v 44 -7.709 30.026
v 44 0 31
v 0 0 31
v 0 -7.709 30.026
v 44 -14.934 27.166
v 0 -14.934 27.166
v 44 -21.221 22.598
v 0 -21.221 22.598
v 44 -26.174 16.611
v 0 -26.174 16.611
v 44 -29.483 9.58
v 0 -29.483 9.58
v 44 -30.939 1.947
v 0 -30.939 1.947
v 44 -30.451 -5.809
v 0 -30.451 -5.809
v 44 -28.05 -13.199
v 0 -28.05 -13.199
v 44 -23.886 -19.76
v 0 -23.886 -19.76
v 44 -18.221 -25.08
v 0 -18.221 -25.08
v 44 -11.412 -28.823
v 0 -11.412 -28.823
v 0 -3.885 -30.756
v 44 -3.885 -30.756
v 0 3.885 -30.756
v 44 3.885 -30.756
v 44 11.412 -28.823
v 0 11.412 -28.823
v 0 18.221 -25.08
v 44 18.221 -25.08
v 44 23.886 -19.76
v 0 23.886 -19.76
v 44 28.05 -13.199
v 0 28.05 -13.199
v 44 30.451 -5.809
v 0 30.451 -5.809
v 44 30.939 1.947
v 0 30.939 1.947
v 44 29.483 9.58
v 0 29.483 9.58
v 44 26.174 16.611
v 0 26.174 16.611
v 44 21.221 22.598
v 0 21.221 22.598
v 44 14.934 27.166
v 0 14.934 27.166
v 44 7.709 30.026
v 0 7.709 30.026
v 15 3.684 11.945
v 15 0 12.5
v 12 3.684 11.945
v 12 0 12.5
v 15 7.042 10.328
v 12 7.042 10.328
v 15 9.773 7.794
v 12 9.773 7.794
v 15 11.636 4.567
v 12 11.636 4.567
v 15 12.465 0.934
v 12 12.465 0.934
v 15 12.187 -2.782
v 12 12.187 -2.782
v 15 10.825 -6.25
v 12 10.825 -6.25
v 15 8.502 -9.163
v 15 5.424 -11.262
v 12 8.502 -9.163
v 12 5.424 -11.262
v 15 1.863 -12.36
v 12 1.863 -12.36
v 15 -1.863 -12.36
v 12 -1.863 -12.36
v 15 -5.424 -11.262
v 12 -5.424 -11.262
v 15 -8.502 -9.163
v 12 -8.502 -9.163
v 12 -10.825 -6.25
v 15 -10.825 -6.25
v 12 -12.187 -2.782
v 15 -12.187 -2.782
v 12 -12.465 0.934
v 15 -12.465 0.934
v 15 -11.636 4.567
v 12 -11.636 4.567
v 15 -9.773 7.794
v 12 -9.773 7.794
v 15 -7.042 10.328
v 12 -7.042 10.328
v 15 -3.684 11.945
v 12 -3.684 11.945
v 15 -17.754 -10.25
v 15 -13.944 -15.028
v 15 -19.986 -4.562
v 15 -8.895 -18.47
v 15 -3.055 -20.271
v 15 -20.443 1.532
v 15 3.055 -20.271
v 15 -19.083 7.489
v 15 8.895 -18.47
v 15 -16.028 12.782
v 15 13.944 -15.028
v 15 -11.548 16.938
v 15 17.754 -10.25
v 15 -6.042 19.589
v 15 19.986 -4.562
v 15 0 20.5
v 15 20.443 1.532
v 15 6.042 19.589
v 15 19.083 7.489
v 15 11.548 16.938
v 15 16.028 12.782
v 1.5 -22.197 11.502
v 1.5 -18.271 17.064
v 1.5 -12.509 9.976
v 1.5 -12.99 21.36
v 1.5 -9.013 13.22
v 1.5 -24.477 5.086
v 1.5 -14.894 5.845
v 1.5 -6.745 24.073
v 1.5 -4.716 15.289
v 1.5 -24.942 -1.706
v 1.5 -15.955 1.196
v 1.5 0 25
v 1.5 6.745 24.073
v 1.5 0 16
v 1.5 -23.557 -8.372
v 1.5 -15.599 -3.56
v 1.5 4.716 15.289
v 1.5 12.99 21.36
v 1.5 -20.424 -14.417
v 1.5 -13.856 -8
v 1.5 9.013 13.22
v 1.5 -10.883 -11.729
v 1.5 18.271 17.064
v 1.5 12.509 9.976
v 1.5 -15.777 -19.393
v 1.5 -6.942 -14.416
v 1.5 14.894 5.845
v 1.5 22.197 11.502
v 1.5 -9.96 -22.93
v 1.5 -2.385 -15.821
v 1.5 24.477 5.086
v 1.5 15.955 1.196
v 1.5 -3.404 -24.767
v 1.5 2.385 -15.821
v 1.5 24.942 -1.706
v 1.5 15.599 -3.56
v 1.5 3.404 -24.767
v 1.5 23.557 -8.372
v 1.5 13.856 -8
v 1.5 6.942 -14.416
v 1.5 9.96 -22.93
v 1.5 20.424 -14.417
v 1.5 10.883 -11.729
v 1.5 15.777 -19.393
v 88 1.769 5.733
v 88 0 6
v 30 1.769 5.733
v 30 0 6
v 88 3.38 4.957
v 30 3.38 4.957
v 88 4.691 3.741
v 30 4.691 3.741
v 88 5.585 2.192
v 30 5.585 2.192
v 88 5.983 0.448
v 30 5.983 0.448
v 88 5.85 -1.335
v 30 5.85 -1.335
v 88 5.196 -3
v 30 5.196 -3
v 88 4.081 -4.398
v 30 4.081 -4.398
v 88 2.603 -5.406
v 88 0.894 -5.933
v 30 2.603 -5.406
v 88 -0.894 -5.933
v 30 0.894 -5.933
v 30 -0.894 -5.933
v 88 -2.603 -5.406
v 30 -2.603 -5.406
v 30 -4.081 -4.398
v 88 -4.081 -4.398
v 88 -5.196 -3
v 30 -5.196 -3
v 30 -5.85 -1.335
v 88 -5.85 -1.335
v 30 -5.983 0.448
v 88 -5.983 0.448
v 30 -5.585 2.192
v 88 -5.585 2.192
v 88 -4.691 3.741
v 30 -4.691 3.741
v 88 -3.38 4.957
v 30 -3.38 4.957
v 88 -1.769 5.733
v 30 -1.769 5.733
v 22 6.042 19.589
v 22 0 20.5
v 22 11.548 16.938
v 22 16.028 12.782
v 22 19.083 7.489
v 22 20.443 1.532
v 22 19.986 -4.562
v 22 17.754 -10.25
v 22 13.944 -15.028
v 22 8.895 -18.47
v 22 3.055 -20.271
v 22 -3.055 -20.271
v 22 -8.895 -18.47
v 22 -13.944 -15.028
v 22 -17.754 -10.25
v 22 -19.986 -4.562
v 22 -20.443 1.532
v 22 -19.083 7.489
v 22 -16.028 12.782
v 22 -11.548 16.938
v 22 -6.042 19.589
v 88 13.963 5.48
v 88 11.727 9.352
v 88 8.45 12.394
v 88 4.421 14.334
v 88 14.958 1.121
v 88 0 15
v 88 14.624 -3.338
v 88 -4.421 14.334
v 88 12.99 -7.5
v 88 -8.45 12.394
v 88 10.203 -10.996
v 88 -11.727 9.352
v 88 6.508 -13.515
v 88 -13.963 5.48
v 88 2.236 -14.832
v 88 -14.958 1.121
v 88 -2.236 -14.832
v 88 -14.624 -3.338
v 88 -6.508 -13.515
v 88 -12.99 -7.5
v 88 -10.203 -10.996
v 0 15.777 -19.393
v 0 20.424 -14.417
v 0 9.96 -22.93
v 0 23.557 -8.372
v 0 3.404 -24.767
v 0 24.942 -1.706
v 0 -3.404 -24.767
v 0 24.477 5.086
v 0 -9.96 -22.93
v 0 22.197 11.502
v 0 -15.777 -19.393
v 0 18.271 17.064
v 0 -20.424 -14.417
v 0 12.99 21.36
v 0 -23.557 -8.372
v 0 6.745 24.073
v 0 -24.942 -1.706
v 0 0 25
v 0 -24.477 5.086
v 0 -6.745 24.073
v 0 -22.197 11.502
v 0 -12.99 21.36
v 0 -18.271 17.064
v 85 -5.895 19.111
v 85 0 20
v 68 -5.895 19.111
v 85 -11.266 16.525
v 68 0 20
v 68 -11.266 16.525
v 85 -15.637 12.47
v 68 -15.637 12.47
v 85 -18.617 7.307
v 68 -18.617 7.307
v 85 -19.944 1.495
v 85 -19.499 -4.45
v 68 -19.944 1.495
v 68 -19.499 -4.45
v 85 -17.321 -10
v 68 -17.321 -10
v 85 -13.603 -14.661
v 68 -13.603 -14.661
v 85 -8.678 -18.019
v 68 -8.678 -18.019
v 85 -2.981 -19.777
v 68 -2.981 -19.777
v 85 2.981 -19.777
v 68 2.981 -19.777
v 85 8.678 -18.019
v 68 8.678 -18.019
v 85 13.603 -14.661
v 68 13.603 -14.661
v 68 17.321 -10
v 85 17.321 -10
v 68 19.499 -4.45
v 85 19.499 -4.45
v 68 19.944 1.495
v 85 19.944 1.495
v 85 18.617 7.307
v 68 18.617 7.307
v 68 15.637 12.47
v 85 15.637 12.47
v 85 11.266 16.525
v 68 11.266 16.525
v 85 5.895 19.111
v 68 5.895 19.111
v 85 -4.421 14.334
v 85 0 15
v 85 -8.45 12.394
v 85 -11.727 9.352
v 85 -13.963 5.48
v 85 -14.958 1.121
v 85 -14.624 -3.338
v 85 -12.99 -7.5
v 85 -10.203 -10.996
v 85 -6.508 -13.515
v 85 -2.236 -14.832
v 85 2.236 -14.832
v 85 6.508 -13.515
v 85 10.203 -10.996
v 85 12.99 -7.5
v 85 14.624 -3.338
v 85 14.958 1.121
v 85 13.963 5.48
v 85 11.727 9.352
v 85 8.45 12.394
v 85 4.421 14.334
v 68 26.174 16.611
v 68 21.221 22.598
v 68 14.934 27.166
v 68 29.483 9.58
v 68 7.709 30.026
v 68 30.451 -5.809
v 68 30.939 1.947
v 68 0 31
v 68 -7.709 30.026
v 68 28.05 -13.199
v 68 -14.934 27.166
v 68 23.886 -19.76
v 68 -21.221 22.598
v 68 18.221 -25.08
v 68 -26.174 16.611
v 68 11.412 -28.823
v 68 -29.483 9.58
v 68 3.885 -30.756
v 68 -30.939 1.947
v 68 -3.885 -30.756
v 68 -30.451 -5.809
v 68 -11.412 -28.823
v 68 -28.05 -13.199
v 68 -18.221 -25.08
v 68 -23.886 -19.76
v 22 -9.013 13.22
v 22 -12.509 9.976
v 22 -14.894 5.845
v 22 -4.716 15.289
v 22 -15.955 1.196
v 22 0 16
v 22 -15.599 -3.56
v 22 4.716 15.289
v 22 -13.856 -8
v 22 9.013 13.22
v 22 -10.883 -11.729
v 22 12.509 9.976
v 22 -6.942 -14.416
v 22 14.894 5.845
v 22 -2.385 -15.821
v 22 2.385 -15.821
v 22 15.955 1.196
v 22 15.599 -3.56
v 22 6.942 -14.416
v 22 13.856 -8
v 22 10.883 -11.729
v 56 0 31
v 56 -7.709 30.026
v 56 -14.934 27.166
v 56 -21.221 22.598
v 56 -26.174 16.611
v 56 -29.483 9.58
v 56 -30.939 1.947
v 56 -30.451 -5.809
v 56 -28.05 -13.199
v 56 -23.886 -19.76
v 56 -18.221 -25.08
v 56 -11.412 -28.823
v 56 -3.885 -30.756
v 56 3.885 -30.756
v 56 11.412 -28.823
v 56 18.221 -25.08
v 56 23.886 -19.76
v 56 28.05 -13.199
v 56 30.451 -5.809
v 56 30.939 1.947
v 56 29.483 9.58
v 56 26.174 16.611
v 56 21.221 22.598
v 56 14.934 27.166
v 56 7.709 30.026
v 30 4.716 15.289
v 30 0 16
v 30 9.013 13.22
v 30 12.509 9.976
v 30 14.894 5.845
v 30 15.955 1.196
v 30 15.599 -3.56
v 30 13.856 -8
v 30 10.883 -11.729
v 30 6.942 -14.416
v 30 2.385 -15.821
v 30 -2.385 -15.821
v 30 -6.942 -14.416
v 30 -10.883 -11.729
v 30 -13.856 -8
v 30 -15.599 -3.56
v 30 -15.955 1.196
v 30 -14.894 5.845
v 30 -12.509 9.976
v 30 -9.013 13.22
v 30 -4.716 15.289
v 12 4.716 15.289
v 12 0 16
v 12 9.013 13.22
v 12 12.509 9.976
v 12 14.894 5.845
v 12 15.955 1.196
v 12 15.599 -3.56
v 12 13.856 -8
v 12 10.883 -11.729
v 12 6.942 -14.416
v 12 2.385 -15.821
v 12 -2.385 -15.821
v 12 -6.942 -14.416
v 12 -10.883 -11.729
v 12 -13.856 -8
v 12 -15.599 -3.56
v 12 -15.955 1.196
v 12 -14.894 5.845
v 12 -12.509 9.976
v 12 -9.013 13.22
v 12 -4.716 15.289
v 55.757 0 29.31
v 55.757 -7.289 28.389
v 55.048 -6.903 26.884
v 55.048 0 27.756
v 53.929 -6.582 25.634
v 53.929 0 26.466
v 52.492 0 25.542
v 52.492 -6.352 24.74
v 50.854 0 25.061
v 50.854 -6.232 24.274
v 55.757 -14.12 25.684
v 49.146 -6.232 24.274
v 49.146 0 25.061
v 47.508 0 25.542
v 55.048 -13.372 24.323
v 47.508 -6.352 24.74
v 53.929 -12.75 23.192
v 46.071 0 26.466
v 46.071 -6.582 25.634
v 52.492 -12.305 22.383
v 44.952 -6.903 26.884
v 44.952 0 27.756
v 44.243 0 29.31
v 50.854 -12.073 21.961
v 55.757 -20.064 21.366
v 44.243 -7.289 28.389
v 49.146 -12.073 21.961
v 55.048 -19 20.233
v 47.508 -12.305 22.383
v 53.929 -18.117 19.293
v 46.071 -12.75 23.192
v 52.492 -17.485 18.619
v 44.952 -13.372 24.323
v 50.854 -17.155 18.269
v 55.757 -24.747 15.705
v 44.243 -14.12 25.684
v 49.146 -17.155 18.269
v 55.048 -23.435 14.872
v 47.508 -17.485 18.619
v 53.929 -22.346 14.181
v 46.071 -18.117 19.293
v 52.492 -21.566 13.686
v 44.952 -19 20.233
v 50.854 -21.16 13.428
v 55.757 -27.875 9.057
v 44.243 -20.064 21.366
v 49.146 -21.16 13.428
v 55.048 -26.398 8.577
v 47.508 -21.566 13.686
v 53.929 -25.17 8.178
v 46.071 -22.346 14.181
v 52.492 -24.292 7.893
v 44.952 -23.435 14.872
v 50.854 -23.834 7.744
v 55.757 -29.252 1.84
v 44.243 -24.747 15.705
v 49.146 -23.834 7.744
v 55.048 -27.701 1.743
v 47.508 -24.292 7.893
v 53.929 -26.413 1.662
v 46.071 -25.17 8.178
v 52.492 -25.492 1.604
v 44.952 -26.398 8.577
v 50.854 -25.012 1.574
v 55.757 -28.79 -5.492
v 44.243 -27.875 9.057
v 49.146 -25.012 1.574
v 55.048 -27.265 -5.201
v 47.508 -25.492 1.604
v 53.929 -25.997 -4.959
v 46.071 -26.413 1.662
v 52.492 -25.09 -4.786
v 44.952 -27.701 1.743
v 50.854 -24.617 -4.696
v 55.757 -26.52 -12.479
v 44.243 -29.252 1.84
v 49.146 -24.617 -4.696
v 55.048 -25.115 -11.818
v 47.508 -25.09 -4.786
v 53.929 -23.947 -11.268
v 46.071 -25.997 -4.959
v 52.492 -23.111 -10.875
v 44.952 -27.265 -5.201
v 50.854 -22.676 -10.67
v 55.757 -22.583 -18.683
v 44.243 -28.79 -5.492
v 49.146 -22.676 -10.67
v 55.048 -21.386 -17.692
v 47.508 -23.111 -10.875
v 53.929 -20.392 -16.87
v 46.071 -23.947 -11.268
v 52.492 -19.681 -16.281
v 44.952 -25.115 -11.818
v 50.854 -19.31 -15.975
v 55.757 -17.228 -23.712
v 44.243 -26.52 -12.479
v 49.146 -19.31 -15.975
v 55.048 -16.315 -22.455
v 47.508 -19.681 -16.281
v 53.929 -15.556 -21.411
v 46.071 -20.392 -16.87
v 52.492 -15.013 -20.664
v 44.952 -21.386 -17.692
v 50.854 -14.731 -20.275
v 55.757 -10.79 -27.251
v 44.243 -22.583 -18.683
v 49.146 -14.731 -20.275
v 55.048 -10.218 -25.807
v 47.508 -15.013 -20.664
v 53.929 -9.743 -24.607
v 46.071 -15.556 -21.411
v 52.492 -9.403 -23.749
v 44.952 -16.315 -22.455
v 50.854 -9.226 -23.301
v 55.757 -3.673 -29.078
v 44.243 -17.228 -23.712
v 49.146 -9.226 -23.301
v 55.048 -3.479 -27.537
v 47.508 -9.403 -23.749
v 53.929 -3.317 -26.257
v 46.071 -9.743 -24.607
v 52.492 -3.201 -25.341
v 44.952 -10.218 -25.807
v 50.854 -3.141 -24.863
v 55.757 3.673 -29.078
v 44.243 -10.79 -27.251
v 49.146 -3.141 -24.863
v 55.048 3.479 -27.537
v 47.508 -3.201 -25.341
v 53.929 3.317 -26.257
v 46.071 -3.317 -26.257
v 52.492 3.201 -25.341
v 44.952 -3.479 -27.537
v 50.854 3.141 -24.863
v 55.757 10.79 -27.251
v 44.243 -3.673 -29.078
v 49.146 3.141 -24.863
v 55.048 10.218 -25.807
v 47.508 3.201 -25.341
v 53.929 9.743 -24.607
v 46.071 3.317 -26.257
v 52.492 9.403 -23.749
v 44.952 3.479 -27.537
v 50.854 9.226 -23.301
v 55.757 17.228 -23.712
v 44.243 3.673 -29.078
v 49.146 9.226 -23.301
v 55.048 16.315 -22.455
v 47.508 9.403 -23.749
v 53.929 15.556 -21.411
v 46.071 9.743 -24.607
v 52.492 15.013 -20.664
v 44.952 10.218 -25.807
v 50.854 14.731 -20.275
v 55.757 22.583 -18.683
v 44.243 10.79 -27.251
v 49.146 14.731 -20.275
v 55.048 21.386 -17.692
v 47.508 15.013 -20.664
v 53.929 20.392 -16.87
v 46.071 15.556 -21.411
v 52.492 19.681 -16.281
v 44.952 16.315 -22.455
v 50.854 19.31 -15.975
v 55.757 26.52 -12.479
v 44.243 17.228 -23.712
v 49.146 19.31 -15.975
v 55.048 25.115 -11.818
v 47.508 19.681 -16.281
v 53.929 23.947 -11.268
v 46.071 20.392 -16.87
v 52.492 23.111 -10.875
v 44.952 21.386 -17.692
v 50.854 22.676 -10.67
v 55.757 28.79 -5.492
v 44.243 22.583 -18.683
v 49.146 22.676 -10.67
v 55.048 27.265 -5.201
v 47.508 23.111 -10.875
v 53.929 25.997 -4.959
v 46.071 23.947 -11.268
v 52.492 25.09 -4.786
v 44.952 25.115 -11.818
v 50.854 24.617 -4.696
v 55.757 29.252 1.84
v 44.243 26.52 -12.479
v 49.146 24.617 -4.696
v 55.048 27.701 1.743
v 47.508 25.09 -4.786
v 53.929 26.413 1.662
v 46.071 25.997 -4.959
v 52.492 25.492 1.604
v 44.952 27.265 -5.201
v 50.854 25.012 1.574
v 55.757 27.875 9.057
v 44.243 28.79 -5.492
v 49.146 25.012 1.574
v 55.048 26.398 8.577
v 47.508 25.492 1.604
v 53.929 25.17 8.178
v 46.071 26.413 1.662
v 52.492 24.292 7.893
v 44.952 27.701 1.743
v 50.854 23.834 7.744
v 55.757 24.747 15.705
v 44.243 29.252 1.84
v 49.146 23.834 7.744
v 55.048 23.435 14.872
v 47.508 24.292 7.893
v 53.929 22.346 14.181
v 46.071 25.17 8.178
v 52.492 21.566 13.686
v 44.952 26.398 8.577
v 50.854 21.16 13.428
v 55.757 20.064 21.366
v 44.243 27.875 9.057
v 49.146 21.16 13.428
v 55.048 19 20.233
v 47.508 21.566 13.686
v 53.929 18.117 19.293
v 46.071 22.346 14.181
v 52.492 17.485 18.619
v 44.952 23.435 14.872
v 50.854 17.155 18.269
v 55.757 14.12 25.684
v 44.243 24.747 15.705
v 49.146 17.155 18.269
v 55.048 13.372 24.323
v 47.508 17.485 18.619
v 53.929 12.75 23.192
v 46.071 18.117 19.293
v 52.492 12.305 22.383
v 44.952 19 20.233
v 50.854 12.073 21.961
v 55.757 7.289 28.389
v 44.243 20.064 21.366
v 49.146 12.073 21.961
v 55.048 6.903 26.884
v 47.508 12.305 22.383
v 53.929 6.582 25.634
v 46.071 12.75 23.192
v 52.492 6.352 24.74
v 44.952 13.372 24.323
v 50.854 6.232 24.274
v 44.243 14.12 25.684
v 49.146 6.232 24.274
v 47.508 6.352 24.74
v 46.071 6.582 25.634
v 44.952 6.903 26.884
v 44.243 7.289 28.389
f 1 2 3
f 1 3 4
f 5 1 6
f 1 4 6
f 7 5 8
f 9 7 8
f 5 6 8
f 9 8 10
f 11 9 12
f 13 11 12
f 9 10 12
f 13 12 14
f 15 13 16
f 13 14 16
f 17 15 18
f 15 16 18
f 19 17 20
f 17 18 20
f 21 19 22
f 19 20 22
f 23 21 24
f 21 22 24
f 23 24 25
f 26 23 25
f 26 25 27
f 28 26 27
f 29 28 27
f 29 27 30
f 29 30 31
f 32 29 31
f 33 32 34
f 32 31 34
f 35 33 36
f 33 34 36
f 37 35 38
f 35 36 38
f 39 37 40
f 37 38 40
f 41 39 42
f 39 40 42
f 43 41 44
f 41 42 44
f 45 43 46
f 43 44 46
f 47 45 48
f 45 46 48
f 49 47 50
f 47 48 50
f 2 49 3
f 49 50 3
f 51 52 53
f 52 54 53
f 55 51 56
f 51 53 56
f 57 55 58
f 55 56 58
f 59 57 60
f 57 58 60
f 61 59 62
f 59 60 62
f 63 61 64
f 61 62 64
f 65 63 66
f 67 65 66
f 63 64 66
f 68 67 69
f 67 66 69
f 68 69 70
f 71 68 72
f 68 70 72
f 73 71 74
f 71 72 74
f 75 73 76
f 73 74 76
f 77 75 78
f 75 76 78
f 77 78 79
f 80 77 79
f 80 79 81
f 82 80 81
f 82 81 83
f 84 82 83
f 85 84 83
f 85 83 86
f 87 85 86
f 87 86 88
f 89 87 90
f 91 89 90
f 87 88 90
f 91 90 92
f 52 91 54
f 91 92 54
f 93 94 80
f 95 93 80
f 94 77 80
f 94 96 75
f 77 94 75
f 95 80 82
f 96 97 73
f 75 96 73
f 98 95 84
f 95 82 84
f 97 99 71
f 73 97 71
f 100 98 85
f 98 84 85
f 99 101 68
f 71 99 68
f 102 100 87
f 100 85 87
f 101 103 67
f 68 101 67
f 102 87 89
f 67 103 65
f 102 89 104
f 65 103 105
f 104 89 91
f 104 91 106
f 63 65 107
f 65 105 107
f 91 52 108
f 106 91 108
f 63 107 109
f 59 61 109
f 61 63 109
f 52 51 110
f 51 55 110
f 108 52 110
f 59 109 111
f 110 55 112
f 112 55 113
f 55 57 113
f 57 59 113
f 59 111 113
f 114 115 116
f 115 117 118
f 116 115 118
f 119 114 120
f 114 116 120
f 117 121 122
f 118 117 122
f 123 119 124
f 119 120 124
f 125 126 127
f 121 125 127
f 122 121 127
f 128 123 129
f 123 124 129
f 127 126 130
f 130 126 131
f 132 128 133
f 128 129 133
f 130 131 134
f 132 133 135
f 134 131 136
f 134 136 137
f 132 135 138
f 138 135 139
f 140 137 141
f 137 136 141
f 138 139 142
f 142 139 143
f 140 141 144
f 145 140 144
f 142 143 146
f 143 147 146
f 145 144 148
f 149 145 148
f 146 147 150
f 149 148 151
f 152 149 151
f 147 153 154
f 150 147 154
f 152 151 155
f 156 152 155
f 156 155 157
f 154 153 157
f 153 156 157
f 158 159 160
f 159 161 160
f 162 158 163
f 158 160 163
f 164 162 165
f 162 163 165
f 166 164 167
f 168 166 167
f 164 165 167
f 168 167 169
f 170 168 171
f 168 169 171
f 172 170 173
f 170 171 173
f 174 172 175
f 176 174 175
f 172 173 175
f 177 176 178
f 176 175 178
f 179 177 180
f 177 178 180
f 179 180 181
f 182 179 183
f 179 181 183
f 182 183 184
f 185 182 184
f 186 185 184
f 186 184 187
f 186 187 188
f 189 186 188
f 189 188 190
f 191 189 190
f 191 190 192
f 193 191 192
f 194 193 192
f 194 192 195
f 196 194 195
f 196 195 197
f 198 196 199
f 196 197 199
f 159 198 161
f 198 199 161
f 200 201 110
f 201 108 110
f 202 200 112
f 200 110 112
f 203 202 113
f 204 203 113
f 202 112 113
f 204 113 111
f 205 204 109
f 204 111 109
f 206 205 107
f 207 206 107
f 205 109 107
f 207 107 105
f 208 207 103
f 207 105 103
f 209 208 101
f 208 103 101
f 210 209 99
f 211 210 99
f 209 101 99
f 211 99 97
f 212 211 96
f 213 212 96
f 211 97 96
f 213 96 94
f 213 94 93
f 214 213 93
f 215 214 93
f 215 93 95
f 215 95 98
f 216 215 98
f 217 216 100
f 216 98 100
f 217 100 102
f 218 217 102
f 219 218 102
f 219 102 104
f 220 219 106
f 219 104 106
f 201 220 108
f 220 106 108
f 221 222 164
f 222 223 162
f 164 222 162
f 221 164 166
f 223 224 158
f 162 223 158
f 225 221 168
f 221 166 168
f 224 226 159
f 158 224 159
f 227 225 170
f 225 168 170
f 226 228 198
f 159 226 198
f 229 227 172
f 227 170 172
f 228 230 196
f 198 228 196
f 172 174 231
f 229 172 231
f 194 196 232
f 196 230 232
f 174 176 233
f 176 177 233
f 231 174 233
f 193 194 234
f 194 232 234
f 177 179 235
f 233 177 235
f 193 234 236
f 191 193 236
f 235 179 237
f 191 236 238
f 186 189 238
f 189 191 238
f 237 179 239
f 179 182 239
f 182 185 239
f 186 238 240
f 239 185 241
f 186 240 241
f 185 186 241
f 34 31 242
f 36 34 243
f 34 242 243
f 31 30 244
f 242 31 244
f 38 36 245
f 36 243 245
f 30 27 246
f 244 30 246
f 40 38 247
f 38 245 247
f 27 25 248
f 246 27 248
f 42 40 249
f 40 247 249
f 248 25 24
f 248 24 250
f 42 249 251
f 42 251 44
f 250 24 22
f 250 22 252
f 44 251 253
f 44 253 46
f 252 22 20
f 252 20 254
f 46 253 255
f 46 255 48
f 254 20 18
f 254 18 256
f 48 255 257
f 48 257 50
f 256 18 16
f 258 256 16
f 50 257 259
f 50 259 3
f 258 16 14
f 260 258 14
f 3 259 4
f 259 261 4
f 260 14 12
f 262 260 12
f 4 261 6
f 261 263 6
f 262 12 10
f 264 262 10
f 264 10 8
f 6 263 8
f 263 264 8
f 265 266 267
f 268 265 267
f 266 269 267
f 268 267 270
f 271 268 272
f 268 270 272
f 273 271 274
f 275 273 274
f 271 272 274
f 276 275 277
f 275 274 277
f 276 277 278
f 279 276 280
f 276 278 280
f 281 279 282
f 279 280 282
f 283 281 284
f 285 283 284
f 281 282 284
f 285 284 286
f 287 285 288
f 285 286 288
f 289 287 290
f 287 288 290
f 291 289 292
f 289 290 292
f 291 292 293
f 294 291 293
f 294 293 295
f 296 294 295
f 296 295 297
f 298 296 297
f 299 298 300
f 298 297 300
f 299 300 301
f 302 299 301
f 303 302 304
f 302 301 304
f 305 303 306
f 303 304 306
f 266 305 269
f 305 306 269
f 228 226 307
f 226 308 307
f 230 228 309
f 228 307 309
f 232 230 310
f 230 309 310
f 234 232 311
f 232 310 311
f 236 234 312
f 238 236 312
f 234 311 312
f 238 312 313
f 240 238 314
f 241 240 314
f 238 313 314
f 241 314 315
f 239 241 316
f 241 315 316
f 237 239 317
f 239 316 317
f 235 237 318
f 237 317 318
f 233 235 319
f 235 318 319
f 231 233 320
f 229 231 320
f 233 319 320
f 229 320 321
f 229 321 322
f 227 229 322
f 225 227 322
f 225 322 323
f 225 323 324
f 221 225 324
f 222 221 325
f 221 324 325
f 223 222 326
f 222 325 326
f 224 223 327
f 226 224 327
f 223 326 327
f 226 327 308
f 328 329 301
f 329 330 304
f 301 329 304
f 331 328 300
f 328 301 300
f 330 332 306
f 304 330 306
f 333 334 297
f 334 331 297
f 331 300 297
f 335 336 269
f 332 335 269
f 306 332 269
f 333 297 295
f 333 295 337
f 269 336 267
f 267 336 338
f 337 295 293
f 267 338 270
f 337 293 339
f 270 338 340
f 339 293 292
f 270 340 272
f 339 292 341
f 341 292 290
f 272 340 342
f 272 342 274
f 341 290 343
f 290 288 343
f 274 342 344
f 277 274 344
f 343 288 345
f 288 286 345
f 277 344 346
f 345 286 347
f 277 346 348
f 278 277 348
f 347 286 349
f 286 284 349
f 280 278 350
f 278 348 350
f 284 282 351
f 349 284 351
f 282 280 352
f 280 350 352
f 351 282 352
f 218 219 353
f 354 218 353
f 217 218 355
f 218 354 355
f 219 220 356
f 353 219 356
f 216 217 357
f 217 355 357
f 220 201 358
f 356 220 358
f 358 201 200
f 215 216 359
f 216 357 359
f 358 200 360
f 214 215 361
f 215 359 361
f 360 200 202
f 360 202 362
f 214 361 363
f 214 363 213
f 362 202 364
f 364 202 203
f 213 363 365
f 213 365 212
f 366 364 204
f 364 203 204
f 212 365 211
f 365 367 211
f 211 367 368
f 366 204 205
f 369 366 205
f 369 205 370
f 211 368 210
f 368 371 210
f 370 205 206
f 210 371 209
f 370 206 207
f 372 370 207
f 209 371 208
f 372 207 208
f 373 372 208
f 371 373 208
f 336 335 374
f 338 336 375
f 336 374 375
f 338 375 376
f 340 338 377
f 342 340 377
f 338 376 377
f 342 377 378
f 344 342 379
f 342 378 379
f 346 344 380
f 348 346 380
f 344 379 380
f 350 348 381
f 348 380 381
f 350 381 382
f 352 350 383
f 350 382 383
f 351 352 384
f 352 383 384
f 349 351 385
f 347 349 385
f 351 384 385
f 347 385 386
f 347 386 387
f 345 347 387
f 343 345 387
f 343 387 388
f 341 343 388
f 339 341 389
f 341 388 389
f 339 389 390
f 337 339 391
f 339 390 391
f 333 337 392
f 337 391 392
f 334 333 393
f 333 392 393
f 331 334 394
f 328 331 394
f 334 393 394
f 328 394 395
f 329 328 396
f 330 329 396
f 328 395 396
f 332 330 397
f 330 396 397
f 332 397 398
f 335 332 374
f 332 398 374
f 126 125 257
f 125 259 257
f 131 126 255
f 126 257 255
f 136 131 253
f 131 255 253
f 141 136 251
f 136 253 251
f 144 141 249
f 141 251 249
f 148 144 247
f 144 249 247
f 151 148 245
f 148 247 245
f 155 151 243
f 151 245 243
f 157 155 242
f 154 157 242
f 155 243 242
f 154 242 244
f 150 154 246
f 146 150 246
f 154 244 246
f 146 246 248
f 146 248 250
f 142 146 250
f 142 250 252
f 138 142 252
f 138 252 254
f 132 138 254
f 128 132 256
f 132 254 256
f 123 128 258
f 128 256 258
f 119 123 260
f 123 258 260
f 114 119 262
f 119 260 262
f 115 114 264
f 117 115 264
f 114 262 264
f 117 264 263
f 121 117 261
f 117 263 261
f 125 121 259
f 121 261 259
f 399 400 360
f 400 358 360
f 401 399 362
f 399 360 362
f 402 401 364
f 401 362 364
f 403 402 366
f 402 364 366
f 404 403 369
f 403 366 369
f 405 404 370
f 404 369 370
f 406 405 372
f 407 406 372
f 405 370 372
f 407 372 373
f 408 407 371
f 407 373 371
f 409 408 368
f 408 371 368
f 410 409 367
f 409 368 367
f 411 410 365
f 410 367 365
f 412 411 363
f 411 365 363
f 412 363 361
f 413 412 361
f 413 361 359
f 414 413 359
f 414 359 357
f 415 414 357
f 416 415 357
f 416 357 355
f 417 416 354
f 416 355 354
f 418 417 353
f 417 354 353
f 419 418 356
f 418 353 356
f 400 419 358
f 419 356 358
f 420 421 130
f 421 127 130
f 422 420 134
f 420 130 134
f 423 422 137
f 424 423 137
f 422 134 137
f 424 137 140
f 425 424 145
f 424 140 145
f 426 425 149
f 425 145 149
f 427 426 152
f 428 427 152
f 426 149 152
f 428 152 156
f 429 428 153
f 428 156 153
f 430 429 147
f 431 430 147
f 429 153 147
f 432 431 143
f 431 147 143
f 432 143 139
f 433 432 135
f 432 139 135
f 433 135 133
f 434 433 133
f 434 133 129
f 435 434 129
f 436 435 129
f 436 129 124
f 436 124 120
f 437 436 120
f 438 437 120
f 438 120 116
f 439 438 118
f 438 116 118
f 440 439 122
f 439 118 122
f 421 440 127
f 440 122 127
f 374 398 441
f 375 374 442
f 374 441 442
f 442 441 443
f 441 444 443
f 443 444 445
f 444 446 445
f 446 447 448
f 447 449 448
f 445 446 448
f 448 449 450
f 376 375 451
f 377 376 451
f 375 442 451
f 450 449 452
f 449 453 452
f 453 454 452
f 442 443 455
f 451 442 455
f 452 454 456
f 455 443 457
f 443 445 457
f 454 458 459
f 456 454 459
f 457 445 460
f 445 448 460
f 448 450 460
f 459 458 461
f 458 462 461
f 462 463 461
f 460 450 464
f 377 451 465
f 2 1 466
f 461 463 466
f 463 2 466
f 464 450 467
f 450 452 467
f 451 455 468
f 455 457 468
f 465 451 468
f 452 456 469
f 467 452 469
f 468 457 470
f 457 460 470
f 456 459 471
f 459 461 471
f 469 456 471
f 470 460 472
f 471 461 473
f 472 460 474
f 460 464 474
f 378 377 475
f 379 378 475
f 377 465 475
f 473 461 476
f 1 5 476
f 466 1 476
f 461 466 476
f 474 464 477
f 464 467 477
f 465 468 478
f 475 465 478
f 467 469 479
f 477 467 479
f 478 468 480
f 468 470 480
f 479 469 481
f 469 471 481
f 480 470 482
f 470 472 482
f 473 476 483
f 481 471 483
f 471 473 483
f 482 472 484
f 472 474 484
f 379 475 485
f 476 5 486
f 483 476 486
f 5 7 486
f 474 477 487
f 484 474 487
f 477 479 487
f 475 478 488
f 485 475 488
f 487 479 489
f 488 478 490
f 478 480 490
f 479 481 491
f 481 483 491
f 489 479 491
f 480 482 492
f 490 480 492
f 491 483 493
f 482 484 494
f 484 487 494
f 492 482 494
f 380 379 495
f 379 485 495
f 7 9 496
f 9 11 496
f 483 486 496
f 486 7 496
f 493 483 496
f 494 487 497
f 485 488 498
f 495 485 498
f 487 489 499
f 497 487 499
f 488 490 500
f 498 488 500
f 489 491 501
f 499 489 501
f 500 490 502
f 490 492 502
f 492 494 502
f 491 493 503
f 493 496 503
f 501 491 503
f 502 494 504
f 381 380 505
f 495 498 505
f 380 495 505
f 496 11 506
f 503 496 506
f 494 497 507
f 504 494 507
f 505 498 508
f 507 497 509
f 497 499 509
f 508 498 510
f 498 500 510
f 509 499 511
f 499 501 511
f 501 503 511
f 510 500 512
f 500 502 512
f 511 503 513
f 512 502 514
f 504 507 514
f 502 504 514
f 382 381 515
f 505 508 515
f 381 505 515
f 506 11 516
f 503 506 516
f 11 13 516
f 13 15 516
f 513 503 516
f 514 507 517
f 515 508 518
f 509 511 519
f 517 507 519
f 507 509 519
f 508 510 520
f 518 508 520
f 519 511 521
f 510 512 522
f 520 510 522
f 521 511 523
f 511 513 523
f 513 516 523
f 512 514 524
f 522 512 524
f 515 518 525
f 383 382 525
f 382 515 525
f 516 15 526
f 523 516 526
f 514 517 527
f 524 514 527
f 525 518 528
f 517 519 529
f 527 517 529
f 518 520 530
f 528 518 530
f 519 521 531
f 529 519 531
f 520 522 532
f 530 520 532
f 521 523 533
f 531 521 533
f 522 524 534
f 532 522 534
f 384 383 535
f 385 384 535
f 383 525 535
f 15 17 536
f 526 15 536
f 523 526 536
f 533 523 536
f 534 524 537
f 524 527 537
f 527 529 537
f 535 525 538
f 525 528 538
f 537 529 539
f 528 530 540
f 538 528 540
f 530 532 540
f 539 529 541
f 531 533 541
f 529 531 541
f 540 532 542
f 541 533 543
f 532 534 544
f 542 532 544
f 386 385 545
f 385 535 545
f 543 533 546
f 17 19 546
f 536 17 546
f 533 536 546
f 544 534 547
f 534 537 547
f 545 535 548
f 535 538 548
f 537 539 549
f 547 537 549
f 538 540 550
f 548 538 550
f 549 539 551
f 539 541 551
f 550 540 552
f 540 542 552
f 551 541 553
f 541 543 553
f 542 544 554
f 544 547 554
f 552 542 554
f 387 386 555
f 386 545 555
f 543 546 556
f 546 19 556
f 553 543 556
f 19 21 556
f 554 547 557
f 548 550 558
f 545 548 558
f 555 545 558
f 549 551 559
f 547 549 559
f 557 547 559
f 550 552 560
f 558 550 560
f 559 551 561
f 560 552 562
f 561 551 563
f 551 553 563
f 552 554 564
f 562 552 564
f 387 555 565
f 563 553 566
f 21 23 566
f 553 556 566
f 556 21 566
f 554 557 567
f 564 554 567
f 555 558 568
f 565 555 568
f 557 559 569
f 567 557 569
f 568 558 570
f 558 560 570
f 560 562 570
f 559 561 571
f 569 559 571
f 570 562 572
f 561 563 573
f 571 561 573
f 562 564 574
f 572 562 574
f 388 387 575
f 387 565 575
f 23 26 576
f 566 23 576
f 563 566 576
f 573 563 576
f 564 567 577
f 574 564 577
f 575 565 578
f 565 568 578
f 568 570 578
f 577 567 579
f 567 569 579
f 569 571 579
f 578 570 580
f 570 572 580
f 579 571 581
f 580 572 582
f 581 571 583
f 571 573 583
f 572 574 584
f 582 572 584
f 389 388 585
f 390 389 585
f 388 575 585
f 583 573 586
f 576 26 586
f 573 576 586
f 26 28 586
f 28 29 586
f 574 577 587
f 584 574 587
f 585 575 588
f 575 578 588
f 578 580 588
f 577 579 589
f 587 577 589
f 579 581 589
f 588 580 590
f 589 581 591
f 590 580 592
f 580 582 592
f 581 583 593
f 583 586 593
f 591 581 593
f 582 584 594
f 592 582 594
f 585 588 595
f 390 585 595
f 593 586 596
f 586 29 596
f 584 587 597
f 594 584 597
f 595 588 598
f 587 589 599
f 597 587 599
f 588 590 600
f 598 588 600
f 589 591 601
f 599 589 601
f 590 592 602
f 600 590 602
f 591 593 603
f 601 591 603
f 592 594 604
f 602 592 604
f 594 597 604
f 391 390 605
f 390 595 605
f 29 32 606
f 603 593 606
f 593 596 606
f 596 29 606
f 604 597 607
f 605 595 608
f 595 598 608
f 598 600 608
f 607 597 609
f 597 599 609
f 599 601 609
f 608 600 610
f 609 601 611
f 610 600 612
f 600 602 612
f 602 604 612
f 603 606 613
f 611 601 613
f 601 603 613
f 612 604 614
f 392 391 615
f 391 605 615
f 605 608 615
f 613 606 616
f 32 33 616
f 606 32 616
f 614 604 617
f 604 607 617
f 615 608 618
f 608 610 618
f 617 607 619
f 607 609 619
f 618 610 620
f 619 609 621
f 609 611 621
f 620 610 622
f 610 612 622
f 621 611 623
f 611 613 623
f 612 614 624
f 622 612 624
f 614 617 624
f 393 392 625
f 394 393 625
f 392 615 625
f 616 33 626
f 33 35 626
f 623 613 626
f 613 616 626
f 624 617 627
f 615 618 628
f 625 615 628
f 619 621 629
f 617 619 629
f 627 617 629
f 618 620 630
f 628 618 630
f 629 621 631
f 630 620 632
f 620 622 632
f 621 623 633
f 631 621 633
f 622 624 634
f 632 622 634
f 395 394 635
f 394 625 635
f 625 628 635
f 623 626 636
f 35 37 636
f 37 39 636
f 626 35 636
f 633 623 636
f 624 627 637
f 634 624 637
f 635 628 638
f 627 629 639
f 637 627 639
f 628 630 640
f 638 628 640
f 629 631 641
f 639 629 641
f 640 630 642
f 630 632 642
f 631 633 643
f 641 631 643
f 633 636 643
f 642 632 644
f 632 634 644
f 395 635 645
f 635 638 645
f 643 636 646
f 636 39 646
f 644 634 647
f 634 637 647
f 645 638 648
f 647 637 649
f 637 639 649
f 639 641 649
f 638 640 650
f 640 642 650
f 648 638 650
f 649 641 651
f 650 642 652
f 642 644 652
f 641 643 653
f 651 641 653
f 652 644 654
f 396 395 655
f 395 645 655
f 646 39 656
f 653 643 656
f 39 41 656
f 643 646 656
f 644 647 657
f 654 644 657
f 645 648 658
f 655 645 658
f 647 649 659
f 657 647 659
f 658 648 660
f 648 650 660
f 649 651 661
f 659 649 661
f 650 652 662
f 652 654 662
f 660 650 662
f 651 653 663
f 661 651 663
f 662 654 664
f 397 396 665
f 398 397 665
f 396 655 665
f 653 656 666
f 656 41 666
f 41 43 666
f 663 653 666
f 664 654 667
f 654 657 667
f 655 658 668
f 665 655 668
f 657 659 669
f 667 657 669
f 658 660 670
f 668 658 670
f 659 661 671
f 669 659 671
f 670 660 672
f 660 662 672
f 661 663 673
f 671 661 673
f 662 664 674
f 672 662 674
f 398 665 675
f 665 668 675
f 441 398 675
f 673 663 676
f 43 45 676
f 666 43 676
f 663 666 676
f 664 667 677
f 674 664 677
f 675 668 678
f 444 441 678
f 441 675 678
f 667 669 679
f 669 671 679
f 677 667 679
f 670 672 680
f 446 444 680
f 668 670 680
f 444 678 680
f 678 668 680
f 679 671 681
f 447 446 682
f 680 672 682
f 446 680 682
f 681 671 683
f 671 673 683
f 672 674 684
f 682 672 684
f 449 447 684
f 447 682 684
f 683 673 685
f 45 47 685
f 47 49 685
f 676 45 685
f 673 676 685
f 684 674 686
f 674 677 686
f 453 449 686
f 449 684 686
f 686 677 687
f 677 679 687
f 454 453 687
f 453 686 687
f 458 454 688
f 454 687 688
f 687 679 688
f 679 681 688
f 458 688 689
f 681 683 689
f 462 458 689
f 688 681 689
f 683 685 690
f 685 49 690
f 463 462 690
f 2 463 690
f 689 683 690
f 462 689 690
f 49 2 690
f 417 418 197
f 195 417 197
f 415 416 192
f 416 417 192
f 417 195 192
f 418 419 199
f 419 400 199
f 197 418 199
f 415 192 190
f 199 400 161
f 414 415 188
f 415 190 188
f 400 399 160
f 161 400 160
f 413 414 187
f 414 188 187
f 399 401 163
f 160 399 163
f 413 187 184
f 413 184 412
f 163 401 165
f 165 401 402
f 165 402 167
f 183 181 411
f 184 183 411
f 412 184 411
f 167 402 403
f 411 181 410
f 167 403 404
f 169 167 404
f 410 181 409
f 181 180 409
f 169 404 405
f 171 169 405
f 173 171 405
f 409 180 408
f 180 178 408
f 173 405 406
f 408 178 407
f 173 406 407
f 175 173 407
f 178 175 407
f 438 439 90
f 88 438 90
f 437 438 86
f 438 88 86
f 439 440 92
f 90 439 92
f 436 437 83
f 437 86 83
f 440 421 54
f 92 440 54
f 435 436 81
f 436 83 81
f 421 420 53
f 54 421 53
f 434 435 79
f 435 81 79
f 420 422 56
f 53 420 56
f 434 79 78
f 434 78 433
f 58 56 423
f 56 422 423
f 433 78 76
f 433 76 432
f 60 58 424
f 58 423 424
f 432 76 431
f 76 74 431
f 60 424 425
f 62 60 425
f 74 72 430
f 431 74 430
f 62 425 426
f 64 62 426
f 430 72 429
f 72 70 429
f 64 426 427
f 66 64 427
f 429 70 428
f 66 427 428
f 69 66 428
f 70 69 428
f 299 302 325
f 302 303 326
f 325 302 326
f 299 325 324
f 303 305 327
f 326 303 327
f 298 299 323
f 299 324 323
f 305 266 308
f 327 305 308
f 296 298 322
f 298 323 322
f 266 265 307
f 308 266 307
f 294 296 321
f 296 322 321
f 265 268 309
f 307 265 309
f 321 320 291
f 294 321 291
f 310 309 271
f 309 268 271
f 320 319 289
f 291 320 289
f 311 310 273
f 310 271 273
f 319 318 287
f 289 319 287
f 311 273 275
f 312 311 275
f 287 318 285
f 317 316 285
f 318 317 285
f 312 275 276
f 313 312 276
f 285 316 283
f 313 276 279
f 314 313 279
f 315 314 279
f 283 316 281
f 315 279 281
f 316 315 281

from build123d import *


with BuildPart() as f1:
    # F0 (on Front) → F1 (revolve)
    with BuildSketch(Plane.XZ):
        with BuildLine():
            Line((0, 31), (0, 0))
            Line((0, 0), (88, 0))
            Line((88, 0), (88, 15))
            Line((88, 15), (85, 15))
            Line((85, 15), (85, 20))
            Line((85, 20), (68, 20))
            Line((68, 20), (68, 31))
            Line((68, 31), (56, 31))
            ThreePointArc((56, 31), (50, 25), (44, 31))
            Line((44, 31), (0, 31))
        make_face()
    revolve(axis=Axis((89.068668, 0, 0), (1, 0, 0)))

    # F2 (on Front) → F3 (revolve, cut)
    with BuildSketch(Plane.XZ):
        Polygon((0, 25), (0, 0), (88, 0), (88, 6), (30, 6), (30, 16), (22, 16), (22, 20.5), (15, 20.5), (15, 12.5), (12, 12.5), (12, 16), (1.5, 16), (1.5, 25), align=None)
    revolve(axis=Axis((-26.017778, 0, 0), (-1, 0, 0)), mode=Mode.SUBTRACT)


solid = f1.part
